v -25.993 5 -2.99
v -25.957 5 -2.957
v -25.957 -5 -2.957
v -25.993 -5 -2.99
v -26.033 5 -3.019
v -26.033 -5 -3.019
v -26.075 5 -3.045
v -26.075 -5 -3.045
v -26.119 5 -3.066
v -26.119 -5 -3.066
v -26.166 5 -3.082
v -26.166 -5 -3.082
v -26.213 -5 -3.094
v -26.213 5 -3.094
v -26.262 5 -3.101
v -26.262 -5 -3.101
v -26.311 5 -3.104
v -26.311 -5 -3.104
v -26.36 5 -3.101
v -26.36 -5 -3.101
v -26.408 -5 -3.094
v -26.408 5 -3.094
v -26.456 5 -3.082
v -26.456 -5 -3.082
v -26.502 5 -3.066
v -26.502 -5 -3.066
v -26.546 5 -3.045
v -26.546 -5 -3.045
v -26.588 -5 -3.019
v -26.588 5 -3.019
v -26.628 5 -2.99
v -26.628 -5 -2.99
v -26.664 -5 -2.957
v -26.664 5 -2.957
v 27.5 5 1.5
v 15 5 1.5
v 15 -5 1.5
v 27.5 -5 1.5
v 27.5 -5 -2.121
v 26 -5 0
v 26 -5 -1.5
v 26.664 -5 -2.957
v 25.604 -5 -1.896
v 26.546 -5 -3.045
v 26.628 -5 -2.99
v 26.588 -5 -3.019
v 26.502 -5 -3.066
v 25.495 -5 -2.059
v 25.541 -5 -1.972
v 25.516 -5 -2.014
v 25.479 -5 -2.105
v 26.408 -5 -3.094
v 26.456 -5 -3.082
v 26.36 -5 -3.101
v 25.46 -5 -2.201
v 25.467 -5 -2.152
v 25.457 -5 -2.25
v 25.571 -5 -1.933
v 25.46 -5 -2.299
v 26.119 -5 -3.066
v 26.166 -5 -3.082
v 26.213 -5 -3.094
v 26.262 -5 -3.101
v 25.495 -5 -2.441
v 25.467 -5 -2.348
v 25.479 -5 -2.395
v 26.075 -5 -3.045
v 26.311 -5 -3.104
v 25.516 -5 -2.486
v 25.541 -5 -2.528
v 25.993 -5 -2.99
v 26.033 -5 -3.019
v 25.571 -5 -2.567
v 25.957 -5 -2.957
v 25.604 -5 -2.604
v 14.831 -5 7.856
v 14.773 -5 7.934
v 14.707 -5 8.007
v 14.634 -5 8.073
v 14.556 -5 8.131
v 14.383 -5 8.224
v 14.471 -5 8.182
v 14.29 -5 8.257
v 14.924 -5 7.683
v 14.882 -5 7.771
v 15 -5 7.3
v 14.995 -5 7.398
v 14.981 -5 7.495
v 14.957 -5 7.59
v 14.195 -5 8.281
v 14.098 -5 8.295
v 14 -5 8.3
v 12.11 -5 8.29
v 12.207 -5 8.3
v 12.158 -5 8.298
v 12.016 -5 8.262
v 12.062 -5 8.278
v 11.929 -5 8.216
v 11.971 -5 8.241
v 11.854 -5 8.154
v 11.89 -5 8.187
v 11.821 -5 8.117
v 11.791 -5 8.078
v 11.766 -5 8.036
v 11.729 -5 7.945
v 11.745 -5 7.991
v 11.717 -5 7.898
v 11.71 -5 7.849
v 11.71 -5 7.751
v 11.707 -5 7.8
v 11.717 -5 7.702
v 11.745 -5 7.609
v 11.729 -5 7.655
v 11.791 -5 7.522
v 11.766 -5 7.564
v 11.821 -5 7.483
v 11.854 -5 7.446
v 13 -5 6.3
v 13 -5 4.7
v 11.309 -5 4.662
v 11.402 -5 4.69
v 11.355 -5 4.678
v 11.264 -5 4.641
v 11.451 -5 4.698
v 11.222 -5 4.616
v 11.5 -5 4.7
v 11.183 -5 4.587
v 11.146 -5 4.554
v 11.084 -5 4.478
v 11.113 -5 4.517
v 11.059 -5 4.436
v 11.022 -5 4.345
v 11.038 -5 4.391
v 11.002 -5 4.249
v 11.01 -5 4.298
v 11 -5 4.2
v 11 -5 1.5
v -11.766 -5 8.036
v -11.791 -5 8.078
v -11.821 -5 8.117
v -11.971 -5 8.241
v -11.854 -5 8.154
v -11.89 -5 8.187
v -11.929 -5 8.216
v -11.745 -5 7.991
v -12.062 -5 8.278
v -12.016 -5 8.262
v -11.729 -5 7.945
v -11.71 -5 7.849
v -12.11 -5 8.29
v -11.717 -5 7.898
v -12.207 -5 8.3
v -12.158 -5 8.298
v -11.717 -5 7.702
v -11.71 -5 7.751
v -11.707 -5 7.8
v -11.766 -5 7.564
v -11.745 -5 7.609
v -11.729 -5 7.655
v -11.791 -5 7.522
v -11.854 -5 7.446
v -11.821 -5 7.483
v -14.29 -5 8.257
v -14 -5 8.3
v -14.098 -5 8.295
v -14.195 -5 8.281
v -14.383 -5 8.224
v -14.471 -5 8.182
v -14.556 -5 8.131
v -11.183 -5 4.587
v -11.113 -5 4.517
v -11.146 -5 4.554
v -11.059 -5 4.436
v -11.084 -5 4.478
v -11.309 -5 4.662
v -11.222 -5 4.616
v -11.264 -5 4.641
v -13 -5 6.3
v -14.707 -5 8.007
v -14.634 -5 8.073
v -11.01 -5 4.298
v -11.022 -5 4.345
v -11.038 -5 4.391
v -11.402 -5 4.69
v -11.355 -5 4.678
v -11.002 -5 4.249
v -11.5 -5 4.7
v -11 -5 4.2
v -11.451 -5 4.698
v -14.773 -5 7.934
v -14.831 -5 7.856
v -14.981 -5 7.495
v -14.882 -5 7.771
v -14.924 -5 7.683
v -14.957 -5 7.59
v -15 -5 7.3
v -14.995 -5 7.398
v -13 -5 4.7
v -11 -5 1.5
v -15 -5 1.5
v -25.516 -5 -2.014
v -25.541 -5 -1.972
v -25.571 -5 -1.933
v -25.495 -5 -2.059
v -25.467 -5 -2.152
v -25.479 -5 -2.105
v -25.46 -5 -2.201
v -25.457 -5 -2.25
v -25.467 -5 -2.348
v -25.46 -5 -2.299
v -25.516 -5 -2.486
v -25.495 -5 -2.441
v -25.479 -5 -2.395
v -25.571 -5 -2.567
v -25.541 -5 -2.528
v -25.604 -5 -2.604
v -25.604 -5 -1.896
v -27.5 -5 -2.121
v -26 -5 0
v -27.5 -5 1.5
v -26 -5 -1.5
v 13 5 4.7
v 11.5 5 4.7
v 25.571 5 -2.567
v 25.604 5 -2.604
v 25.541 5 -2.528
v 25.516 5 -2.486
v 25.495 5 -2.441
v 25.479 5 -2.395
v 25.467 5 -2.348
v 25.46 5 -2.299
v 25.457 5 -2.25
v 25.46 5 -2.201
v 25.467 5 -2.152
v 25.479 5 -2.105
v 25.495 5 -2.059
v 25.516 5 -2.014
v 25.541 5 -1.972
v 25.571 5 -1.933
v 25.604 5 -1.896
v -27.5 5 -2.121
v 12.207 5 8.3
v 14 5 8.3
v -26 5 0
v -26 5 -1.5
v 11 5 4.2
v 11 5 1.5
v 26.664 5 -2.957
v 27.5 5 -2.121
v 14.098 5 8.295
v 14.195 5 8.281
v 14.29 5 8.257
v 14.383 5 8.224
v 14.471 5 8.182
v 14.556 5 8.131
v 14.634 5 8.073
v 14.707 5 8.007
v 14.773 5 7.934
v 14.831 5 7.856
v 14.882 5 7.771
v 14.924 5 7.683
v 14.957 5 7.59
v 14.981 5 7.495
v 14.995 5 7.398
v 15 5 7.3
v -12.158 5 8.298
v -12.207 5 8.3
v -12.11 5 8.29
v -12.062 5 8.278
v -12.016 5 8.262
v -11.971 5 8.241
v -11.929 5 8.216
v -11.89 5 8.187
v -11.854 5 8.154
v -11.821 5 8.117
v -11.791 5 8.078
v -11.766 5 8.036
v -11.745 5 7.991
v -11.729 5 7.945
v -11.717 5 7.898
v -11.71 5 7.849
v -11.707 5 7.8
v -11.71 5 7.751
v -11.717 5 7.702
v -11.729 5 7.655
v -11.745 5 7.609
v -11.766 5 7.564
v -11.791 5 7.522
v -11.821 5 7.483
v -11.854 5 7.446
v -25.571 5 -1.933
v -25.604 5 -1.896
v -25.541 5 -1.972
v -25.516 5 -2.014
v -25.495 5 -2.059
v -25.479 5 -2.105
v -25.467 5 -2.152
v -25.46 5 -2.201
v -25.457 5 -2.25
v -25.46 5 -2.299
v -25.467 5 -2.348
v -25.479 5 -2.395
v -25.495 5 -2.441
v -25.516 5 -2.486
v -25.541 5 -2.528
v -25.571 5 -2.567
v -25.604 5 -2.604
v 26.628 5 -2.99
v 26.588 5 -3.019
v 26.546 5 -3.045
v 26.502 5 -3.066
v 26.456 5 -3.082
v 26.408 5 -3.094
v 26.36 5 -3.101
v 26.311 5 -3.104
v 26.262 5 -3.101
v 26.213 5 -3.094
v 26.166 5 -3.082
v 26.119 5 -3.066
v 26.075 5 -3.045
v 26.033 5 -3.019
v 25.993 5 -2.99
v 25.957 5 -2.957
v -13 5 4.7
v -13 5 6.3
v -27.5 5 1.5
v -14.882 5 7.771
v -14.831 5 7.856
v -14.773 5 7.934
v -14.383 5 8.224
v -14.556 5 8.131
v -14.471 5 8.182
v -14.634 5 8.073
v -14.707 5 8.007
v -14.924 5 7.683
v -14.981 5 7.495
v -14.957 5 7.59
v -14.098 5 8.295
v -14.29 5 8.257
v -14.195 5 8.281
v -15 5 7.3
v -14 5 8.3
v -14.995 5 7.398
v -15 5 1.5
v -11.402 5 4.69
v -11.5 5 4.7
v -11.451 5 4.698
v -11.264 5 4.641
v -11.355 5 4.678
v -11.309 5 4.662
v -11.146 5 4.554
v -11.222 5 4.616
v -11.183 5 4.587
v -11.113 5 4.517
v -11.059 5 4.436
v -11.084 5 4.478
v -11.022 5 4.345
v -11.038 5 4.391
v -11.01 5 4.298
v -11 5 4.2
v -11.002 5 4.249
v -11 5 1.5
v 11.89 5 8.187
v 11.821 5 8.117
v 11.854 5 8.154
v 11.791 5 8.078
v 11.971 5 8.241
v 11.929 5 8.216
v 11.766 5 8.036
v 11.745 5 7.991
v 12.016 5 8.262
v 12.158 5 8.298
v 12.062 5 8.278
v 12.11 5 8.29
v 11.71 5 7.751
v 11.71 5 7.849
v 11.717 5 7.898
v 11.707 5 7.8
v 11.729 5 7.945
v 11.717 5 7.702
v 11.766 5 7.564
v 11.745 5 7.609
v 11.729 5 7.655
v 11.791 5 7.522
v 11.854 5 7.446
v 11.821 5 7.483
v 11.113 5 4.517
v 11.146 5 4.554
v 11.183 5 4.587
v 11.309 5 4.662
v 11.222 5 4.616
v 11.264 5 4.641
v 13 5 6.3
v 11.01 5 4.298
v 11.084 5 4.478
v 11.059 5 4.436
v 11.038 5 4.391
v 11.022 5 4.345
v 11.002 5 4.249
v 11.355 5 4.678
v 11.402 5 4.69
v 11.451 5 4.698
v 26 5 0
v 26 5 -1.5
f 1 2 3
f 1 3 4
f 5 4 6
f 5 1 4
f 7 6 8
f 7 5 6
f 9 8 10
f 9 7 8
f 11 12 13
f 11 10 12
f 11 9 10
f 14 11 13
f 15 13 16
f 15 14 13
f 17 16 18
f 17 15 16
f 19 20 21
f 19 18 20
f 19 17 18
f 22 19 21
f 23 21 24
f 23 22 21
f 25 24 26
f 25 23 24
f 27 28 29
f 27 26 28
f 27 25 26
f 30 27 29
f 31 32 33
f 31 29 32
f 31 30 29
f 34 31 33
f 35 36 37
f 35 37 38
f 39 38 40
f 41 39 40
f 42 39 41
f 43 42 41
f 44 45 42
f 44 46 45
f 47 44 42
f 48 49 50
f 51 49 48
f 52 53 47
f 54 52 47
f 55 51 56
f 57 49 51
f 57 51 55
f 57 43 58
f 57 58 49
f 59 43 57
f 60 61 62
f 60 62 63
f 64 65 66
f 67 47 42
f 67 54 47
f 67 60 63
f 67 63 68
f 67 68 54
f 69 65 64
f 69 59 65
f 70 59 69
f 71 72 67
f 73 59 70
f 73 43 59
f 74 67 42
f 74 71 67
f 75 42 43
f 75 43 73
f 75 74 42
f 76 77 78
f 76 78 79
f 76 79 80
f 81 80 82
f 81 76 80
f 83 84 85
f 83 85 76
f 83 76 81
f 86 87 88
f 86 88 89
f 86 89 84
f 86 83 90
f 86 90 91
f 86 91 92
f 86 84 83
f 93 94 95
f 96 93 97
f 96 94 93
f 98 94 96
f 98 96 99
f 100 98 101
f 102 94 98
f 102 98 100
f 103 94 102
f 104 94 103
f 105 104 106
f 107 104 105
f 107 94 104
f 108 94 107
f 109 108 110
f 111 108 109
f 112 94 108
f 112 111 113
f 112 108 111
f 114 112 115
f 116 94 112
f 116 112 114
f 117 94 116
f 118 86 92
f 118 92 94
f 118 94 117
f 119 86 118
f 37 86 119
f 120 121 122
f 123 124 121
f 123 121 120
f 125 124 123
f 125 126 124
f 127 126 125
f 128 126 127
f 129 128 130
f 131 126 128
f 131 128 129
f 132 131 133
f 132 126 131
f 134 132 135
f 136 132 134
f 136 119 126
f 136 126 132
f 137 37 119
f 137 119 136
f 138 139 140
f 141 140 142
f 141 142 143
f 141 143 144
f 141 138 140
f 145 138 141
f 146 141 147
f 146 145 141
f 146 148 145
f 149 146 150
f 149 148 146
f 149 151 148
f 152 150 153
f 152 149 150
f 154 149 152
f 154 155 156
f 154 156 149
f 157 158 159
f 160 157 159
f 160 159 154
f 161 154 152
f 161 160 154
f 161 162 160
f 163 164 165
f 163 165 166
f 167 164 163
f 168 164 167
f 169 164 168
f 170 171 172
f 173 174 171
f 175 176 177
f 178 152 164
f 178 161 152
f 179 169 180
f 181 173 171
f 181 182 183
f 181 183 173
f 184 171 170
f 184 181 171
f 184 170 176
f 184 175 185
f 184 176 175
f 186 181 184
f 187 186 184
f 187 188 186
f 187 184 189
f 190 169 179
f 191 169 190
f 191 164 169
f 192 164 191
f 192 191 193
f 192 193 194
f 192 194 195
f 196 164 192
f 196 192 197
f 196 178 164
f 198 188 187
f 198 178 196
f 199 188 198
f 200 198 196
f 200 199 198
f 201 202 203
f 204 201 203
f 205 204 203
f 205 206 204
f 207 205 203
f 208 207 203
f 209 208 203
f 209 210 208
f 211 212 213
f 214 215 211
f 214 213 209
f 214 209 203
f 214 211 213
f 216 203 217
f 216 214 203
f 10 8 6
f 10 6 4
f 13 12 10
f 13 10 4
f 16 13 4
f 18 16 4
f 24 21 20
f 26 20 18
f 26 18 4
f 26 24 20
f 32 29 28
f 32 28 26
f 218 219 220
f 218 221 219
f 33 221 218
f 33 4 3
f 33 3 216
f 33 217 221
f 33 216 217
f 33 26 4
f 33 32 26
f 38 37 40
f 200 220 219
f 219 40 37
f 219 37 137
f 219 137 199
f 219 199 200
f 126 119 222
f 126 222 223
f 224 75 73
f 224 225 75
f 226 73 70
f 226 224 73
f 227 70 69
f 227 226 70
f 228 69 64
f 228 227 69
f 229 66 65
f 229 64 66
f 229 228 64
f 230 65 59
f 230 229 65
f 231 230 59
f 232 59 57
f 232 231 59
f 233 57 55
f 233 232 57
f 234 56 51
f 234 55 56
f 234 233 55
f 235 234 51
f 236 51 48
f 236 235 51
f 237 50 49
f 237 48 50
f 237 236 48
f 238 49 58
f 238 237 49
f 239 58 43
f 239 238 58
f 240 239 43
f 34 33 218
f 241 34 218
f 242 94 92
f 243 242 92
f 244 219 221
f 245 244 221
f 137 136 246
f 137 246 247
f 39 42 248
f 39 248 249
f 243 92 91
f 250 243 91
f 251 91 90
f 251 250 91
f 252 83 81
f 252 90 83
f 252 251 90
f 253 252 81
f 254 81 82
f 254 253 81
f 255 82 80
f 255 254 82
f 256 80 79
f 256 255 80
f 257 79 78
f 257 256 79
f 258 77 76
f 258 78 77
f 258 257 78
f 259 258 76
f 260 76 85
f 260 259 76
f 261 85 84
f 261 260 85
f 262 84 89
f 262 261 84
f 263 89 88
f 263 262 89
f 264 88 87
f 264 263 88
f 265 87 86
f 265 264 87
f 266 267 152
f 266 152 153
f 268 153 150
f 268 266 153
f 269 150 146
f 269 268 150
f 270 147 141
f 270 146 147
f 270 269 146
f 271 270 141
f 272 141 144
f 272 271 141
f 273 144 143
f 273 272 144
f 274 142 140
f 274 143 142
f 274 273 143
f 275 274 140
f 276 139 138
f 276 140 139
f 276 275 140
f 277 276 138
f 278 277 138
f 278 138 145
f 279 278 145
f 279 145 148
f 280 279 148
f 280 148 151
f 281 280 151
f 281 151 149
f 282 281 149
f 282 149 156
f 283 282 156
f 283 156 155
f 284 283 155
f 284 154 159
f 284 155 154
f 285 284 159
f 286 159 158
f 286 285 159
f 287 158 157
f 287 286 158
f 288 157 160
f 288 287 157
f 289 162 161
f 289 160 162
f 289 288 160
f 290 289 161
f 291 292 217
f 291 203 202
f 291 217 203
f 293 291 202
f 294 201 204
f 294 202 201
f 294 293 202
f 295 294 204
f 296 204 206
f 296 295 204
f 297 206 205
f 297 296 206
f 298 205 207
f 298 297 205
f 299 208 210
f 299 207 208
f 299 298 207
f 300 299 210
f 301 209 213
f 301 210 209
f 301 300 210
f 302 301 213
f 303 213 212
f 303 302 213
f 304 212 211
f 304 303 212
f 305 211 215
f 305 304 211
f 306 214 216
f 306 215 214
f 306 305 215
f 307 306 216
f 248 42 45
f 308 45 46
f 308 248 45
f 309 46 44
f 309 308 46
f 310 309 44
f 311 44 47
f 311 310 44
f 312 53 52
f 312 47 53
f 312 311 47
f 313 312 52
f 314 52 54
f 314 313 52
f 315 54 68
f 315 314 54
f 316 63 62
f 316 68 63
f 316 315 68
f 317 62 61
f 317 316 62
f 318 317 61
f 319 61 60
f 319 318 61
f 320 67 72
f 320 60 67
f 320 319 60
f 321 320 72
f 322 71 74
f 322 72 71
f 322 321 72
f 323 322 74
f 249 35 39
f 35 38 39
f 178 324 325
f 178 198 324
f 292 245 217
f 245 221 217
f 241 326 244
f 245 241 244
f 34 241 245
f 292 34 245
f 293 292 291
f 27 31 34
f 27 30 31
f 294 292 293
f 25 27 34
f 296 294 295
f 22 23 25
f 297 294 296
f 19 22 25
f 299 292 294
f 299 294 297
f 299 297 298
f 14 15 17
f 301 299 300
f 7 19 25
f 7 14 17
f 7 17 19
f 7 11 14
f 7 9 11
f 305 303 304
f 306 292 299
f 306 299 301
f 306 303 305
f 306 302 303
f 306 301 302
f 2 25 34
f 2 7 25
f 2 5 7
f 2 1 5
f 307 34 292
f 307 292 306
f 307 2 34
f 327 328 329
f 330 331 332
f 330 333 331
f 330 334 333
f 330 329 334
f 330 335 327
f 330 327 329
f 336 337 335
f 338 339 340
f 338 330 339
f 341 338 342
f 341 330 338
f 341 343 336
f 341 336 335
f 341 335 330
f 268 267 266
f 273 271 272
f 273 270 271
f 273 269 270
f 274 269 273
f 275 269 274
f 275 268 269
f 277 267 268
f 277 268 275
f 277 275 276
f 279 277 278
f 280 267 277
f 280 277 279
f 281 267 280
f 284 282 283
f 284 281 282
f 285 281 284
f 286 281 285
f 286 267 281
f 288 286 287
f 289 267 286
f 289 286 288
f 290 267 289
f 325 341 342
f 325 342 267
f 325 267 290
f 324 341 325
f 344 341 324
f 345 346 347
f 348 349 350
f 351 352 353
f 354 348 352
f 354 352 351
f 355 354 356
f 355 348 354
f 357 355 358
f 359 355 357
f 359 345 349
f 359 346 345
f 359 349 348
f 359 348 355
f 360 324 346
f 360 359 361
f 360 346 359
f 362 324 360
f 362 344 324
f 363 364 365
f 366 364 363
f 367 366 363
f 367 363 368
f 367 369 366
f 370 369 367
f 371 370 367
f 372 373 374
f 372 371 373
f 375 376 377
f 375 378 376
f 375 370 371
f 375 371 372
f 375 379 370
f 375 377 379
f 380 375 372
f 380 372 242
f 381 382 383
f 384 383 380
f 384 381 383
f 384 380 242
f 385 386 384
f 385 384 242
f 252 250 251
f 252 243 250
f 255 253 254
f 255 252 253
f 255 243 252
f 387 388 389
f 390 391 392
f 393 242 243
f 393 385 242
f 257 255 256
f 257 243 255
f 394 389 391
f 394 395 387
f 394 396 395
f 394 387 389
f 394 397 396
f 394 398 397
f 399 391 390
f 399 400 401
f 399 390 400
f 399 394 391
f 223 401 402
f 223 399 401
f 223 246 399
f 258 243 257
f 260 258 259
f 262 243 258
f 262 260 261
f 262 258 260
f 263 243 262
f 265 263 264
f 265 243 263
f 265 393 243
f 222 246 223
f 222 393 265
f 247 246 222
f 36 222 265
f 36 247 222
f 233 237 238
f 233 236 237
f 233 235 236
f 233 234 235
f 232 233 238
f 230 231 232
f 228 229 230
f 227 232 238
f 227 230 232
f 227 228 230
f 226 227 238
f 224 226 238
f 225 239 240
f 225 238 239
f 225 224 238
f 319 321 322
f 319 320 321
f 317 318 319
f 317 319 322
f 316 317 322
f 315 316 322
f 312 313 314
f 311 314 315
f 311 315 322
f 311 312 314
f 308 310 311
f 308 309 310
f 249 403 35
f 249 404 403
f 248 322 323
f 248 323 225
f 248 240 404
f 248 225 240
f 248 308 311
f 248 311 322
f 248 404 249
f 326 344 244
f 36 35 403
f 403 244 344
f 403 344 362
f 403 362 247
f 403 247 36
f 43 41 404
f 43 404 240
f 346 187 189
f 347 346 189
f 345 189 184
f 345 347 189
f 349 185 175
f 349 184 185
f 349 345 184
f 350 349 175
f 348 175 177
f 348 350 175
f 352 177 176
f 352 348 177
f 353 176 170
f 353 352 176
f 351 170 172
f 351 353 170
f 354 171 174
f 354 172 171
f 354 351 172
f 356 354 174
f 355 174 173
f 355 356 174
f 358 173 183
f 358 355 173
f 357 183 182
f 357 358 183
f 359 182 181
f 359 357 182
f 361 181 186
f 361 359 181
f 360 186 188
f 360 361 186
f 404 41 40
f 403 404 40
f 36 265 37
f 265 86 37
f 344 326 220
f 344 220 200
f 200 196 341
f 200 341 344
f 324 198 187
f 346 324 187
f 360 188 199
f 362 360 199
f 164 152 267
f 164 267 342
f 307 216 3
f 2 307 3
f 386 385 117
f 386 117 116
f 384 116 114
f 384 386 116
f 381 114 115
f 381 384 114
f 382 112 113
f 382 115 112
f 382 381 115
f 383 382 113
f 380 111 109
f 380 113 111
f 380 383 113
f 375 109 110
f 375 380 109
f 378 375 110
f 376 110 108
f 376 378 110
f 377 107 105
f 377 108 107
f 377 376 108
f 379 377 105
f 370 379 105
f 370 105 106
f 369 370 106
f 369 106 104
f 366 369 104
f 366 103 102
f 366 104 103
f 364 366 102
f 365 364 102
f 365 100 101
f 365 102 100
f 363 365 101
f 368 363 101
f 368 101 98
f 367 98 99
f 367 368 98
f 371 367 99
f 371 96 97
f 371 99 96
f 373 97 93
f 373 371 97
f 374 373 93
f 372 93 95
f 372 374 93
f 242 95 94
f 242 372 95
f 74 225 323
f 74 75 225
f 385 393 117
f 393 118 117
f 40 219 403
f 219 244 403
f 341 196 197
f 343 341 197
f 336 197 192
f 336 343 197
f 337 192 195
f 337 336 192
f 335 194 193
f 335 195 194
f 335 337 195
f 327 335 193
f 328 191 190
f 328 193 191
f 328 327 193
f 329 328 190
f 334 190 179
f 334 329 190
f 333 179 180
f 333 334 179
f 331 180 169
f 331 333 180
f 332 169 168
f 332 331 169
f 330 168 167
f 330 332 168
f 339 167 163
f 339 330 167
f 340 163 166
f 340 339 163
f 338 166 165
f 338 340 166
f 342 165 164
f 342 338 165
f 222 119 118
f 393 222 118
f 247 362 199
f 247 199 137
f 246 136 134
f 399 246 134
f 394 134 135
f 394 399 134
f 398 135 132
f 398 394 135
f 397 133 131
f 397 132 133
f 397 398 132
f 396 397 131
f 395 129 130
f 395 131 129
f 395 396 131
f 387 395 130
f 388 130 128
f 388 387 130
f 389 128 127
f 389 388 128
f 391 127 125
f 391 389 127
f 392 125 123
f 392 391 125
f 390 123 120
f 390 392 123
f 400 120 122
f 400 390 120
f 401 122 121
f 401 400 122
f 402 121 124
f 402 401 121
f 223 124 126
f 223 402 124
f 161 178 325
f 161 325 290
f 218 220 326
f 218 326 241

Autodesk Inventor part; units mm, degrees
ref_plane "YZ Plane" through (0, 0, 0) normal (1, 0, 0) x (0, 1, 0)
ref_plane "XZ Plane" through (0, 0, 0) normal (0, 1, 0) x (-1, 0, 0)
ref_plane "XY Plane" through (0, 0, 0) normal (0, 0, 1) x (1, 0, 0)
sketch "Sketch1" plane through (0, 0, 0) normal (0, 0, 1) x (1, 0, 0)
  line L0 (-26, 5) -> (26, 5)
  line L1 (26, 5) -> (26, -5)
  line L2 (26, -5) -> (-26, -5)
  line L3 (-26, -5) -> (-26, 5)
  point P0 (0, 0)
  dimension "d0" = 52
  dimension "d1" = 10
extrude "Extrusion1" add sketch "Sketch1" along normal blind 1.5
sketch "Sketch2" plane through (-26, -5, 0) normal (0, -1, 0) x (1, 0, 0)
  line L0 (0, 1.5) -> (52, 1.5) projected
  line L1 (26, 1.5) -> (13, 1.5)
  line L2 (13, 4.7) -> (15, 4.7)
  line L3 (15, 4.7) -> (15, 1.5)
  line L4 (13, 4.7) -> (13, 6.3)
  line L5 (13, 6.3) -> (15, 8.3)
  line L6 (13, 6.3) -> (15.8284, 6.3) construction
  line L7 (15, 8.3) -> (11, 8.3)
  line L8 (11, 8.3) -> (11, 1.5)
  line L9 (52, 1.5) -> (0, 1.5) projected
  line L10 (11, 1.5) -> (15, 1.5)
  line L11 (26, 1.5) -> (26, 4.9)
  line L12 (39, 4.7) -> (37, 4.7)
  line L13 (37, 4.7) -> (37, 1.5)
  line L14 (39, 4.7) -> (39, 6.3)
  line L15 (39, 6.3) -> (37, 8.3)
  line L16 (39, 6.3) -> (36.1716, 6.3) construction
  line L17 (37, 8.3) -> (41, 8.3)
  line L18 (41, 8.3) -> (41, 1.5)
  line L19 (41, 1.5) -> (37, 1.5)
  point P0 (26, 0)
  point P1 (39, 1.5)
  dimension "d4" = 13
  dimension "d5" = 3.2
  dimension "d6" = 2
  dimension "d7" = 1.6
  dimension "d8" = 45
extrude "Extrusion2" add sketch "Sketch2" against normal blind 10
sketch "Sketch3" plane through (-26, -5, 0) normal (0, -1, 0) x (1, 0, 0)
  line L0 (0, 0) -> (52, 0) projected
  line L1 (0, 0) -> (0, -1.5)
  line L2 (0, 0) -> (0, 1.5) projected
  line L3 (0, 1.5) -> (-1.5, 1.5)
  line L4 (0, -1.5) -> (0.75, -2.25)
  line L5 (0, -1.5) -> (4.2622, -1.5) construction
  line L6 (0.75, -2.25) -> (-0.3107, -3.3107)
  line L7 (0.75, -2.25) -> (-0.3107, -3.3107)
  line L8 (0, 1.5) -> (-1.5, 1.5)
  line L9 (-1.5, 1.5) -> (-1.5, -2.1213)
  line L10 (-0.3107, -3.3107) -> (-1.5, -2.1213)
  line L11 (26, 0) -> (26, -3.3107)
  line L12 (52, 0) -> (52, -1.5)
  line L13 (52, 0) -> (52, 1.5)
  line L14 (52, 1.5) -> (53.5, 1.5)
  line L15 (52, -1.5) -> (51.25, -2.25)
  line L16 (52, -1.5) -> (47.7378, -1.5) construction
  line L17 (51.25, -2.25) -> (52.3107, -3.3107)
  line L18 (51.25, -2.25) -> (52.3107, -3.3107)
  line L19 (52, 1.5) -> (53.5, 1.5)
  line L20 (53.5, 1.5) -> (53.5, -2.1213)
  line L21 (52.3107, -3.3107) -> (53.5, -2.1213)
  dimension "d11" = 1.5
  dimension "d13" = 45
  dimension "d15" = 1.5
extrude "Extrusion3" add sketch "Sketch3" against normal blind 10
fillet "Fillet1" radius 0.5 4 edges at (-25.25, 0, -2.25) (-26.3107, 0, -3.3107) (25.25, 0, -2.25) (26.3107, 0, -3.3107)
fillet "Fillet2" radius 1 2 edges at (-15, 0, 8.3) (15, 0, 8.3)
fillet "Fillet3" radius 0.5 2 edges at (-11, 0, 8.3) (11, 0, 8.3)
fillet "Fillet4" radius 0.5 2 edges at (-11, 0, 4.7) (11, 0, 4.7)
properties part number "env_combo_holder"
